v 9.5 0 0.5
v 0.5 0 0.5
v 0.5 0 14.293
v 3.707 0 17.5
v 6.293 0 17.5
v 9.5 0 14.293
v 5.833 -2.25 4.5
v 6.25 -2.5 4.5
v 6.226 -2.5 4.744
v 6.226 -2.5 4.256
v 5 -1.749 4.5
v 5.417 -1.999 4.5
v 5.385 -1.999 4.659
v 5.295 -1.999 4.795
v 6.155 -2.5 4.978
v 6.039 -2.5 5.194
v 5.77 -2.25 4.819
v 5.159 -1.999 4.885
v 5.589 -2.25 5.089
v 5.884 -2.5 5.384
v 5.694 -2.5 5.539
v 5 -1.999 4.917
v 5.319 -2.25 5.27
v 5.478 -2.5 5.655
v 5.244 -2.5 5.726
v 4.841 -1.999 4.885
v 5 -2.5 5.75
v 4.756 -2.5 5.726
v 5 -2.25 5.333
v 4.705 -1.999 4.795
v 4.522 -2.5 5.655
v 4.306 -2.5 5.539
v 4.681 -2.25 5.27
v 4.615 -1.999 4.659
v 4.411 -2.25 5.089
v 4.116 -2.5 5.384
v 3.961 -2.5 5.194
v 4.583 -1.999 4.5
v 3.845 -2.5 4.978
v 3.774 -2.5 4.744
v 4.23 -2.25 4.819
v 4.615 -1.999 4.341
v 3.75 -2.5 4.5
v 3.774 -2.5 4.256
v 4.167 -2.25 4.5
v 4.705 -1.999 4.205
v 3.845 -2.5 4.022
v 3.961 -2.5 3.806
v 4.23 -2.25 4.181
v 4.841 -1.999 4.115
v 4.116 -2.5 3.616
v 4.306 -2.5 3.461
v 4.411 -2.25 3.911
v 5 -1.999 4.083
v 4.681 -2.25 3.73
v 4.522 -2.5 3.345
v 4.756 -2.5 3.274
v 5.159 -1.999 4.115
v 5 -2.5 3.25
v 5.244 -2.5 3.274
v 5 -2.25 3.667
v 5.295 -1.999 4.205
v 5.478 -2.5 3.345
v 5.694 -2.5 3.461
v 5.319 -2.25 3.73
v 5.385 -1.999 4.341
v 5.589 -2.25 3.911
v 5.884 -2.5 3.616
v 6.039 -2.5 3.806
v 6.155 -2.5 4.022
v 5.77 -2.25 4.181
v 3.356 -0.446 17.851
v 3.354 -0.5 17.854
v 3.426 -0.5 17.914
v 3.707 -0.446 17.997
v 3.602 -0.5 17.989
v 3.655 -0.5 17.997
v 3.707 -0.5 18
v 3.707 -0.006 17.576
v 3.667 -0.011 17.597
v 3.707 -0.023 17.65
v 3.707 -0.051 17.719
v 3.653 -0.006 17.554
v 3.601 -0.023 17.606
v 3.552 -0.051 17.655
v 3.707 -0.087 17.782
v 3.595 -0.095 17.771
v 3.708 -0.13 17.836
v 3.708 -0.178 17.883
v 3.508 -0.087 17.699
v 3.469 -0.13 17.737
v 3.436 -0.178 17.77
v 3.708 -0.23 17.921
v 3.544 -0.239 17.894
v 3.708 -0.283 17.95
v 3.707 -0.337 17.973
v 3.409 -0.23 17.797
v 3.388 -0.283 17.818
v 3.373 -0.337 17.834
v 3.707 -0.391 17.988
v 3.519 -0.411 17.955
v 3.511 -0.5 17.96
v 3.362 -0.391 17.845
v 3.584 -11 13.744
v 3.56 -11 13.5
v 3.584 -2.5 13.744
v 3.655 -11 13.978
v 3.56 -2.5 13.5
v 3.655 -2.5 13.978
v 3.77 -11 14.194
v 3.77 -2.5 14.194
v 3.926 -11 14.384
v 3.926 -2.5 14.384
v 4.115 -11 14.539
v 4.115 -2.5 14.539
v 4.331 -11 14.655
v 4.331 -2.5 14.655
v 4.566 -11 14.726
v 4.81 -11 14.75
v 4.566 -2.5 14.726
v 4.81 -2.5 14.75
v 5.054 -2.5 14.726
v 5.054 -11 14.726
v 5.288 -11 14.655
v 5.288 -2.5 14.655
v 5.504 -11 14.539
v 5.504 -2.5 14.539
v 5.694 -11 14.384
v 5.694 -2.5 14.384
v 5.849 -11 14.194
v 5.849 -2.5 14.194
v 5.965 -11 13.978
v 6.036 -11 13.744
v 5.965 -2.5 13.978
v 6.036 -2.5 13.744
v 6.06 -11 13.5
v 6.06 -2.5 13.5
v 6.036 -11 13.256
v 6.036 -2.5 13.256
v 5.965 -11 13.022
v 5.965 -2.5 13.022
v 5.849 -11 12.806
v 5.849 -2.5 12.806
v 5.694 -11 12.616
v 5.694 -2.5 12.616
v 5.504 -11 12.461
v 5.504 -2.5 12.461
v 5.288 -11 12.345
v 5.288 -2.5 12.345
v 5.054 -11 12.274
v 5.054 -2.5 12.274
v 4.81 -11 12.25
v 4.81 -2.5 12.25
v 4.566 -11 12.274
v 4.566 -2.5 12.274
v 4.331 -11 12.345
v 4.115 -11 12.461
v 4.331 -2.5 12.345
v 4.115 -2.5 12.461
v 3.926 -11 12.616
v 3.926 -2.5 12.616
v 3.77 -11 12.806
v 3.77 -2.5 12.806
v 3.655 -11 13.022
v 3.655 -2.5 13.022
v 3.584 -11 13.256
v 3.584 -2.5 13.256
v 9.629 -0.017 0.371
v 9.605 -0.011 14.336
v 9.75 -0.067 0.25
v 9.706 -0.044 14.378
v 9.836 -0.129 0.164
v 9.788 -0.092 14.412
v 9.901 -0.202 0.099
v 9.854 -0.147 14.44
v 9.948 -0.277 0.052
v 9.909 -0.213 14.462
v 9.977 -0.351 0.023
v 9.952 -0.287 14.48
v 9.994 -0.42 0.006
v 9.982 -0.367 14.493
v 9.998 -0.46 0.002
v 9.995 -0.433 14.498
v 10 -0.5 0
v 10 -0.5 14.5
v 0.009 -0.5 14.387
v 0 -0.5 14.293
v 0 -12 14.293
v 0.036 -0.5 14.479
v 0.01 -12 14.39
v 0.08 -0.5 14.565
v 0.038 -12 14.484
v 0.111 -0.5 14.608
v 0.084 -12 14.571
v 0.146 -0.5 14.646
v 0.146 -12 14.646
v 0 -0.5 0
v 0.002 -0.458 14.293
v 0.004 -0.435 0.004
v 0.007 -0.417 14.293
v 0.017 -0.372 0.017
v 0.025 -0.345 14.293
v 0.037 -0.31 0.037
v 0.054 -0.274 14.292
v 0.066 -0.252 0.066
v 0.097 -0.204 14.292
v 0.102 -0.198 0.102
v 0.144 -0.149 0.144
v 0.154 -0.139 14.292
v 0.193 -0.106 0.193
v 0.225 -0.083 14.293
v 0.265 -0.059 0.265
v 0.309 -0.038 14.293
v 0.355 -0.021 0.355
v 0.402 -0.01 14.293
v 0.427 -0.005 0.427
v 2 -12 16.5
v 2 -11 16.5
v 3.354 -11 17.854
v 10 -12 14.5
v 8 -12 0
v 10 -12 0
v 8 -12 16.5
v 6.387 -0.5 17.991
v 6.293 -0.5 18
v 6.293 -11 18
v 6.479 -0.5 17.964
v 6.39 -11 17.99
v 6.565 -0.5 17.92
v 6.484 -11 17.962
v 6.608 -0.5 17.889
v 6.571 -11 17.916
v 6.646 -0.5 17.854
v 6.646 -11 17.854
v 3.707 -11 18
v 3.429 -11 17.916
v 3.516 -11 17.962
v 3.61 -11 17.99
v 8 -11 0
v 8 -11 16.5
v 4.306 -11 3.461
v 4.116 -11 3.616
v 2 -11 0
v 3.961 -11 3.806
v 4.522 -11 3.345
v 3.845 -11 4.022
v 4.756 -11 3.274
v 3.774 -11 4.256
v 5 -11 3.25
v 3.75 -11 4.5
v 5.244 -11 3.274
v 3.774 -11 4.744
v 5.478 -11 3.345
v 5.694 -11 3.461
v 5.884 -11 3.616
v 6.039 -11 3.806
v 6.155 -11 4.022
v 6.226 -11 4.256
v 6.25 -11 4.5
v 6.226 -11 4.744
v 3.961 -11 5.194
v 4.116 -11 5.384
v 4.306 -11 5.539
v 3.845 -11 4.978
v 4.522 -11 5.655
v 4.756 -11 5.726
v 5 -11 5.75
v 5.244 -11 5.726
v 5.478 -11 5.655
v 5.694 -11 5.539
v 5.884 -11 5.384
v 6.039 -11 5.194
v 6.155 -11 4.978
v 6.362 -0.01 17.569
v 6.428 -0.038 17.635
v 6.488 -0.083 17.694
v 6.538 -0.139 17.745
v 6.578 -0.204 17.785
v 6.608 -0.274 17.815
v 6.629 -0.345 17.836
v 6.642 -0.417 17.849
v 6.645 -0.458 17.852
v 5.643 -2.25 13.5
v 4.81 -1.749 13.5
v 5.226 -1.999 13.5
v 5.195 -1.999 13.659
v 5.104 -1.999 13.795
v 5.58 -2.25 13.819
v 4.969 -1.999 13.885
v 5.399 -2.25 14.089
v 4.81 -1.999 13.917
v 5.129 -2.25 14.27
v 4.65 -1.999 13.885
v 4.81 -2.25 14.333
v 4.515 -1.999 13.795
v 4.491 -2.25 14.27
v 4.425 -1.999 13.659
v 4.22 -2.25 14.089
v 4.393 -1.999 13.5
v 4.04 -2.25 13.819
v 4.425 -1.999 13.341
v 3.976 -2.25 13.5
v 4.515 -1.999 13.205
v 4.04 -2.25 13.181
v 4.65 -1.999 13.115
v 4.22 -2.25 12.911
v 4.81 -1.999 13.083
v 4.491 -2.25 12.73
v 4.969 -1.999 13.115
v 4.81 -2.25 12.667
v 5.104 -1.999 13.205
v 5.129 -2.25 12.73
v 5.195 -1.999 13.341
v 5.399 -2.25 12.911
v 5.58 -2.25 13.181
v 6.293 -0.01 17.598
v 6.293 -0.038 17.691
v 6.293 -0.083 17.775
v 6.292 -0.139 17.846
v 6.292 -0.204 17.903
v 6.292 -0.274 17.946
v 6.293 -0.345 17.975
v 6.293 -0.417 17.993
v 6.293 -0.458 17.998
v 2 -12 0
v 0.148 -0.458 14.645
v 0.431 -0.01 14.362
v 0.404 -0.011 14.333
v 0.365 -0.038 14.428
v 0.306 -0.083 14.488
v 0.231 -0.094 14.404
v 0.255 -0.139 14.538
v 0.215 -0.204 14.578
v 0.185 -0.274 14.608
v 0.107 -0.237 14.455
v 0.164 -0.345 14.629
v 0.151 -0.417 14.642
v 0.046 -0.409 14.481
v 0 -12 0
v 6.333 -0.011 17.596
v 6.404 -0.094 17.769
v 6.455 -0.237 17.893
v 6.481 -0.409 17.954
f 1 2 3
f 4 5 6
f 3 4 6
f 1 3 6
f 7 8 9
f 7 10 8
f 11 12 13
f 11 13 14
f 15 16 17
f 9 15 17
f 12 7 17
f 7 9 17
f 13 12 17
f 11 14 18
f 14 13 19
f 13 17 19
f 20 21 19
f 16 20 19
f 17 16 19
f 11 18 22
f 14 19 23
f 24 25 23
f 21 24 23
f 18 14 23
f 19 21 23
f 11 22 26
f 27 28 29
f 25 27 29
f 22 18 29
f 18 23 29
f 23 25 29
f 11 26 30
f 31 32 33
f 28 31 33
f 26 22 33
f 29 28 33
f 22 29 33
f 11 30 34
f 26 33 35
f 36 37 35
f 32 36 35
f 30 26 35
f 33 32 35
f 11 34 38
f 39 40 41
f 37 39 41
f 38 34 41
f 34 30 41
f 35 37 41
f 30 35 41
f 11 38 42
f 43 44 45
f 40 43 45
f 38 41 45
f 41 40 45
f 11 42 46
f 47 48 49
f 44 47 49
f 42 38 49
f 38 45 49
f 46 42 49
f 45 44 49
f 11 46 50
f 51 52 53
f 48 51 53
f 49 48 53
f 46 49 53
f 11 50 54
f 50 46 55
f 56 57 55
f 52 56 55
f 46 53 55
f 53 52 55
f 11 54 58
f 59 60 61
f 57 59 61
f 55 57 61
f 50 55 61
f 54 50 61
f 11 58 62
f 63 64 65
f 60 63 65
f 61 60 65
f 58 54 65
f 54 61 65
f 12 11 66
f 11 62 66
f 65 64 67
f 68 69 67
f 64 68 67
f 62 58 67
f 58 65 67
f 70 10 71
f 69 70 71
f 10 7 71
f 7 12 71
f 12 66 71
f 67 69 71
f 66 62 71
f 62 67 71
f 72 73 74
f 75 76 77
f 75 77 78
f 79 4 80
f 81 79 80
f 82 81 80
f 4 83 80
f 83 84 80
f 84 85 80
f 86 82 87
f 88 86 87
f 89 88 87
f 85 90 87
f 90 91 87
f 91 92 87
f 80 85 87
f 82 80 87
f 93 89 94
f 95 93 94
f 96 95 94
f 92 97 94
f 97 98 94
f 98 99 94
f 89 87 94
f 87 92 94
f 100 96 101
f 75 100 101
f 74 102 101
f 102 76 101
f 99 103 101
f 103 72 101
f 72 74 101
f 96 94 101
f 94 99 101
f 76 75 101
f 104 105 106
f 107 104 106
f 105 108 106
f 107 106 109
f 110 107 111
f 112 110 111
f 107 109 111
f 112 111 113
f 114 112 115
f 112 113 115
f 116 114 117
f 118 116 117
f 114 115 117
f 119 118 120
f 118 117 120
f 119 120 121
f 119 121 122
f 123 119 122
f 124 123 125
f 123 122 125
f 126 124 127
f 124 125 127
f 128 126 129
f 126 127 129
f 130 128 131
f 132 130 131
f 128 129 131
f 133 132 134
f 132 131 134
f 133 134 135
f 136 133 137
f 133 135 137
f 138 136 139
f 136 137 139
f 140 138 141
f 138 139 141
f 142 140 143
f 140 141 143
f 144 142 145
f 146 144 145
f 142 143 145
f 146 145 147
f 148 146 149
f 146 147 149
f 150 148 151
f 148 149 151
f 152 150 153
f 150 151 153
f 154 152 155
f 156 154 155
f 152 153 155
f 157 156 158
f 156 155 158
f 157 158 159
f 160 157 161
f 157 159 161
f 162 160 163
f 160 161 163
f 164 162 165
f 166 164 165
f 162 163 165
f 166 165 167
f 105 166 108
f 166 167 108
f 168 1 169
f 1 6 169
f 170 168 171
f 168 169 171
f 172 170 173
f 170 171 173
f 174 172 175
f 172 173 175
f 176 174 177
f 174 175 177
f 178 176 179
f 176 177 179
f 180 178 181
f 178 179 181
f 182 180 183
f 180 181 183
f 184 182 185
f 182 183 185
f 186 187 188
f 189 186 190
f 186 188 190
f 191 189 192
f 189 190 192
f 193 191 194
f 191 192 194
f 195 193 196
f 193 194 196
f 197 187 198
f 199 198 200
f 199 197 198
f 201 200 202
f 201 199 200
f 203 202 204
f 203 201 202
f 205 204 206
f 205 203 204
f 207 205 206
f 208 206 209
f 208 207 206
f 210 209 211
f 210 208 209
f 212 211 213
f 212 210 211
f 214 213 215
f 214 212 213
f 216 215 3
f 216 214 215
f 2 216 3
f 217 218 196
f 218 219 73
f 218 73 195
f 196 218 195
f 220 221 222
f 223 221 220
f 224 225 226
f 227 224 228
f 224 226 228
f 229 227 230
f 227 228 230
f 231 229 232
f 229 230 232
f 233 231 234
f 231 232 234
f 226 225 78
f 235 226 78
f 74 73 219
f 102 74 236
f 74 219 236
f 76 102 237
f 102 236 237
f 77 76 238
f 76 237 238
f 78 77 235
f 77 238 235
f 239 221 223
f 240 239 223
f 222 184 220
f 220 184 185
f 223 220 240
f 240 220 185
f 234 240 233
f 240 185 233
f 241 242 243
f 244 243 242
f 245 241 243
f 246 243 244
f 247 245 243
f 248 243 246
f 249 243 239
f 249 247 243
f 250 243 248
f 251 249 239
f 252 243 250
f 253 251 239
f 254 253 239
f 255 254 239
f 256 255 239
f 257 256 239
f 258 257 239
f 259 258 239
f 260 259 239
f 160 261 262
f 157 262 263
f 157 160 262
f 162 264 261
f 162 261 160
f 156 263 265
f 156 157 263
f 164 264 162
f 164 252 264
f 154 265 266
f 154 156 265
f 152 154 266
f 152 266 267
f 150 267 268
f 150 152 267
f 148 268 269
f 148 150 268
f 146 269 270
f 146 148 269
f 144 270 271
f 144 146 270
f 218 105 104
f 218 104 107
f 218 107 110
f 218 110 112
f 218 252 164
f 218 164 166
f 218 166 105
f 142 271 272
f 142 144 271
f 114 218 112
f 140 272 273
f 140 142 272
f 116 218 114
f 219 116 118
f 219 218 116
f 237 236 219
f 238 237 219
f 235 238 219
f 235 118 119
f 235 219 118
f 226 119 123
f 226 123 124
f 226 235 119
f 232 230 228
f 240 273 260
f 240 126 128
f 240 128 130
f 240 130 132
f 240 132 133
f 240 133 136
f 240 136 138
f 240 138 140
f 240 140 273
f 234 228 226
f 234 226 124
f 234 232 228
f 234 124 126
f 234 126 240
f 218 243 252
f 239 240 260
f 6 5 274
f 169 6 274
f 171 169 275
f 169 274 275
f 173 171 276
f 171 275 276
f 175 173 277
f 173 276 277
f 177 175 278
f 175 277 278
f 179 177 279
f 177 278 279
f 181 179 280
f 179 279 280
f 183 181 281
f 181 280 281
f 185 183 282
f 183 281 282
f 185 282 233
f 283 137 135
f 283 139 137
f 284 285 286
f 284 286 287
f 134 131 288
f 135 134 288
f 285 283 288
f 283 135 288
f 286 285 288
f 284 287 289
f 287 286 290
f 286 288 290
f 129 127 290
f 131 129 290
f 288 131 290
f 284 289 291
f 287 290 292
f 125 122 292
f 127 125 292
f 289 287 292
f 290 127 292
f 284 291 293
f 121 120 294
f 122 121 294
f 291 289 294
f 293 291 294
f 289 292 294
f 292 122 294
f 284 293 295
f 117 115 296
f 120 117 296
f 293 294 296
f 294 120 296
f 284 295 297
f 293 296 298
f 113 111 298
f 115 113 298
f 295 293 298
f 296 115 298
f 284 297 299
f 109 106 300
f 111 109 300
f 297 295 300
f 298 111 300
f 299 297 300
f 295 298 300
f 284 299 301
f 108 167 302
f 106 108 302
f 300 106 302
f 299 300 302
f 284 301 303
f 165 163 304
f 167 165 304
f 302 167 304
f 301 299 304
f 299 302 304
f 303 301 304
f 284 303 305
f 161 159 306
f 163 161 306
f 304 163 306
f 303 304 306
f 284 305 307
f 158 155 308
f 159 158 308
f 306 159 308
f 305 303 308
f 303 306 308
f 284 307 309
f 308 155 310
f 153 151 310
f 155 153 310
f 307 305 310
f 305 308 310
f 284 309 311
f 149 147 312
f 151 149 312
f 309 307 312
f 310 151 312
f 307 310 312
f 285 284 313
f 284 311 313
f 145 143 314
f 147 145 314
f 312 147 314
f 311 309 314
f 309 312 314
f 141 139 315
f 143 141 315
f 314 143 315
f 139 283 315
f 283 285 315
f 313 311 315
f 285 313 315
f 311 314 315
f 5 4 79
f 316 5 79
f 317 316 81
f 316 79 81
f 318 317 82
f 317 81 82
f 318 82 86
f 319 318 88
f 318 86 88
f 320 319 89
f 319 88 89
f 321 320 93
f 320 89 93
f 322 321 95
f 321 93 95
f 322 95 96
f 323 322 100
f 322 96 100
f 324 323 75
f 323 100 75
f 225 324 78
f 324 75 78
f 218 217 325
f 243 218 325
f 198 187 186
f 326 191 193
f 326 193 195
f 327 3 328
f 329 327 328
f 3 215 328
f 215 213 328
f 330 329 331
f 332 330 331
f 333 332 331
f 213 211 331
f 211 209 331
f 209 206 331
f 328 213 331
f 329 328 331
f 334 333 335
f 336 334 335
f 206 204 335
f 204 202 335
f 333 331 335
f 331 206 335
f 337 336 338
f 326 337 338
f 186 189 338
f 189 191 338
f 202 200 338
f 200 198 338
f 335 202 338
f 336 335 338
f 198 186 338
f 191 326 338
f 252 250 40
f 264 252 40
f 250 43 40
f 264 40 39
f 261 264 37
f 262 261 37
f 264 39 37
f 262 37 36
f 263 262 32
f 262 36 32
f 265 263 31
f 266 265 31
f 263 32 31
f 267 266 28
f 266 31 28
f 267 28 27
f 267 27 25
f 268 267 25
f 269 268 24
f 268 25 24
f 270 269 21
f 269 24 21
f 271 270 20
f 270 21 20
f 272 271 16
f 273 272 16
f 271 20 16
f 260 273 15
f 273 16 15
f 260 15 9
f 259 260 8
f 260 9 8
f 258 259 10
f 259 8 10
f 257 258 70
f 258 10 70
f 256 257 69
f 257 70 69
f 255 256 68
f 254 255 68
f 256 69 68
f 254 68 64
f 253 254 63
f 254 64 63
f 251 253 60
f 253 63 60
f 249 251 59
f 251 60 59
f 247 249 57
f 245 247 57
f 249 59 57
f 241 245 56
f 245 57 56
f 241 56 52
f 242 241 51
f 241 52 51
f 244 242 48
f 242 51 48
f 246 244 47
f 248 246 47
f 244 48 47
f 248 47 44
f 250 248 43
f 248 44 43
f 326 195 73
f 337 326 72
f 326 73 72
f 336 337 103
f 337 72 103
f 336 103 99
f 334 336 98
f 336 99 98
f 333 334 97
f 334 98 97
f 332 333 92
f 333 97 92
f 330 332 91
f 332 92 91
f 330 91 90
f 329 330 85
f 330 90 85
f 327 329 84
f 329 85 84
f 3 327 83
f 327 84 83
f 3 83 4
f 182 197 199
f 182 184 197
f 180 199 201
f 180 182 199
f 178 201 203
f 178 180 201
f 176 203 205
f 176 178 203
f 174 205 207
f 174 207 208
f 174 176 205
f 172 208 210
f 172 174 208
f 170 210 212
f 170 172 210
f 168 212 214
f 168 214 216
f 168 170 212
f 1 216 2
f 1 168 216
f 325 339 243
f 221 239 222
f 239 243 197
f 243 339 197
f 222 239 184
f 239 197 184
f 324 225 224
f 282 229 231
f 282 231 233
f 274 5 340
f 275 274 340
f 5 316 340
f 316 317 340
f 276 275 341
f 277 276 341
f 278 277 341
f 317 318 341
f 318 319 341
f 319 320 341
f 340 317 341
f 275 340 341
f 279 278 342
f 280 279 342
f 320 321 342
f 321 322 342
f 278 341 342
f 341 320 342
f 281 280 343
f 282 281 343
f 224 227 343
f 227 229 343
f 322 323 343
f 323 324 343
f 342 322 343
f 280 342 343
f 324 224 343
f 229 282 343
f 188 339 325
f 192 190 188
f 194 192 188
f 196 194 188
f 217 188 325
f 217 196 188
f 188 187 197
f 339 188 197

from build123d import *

# Parameters (mm, degrees)
F1_DEPTH    = 12
F2_W        = 6
F2_H        = 22.400515154
F4_DEPTH    = 1
F6_D        = 2.5
F6_DEPTH    = 9.5
F6_TIP      = 0.7510757738
F7_R        = 0.5
F8_T1_DEPTH = 4.7928932188
F8_T3_DEPTH = 6.7426406871
F9_R        = 0.5


# Not quite as in the source:
# - a fillet or chamfer that OpenCascade refuses, or shapes differently, is made with other operations: its cross-section is extruded or revolved along the edge and cut away or added


with BuildPart() as f1:
    # F0 (on Front) → F1 (new body)
    with BuildSketch(Plane.XZ):
        Polygon((0, 14.5), (0, 0), (10, 0), (10, 14.5), (6.5, 18), (3.5, 18), align=None)
    extrude(amount=F1_DEPTH)

    # F2 (on face) → F4 (cut)
    with BuildSketch(Plane.XZ.offset(12)):
        with Locations((5, 11.200257577)):
            Rectangle(F2_W, F2_H)
        Polygon((2, 16.5), (2, 0), (8, 0), (8, 16.5), (6.5, 18), (3.5, 18), align=None)
    extrude(amount=-F4_DEPTH, mode=Mode.SUBTRACT)

    # F6
    with Locations(Plane.XZ.offset(12)):
        with Locations((4.8096684931, 13.5), (5, 4.5)):
            Hole(F6_D / 2, depth=F6_DEPTH)
            with Locations((0, 0, -(F6_DEPTH + F6_TIP / 2))):  # 118° drill point
                Cone(0, F6_D / 2, F6_TIP, mode=Mode.SUBTRACT)

    # F7
    f7_edges = [f1.edges().sort_by_distance(p)[0] for p in [
        (10, 0, 7.25),
        (8.25, 0, 16.25),
        (0, 0, 7.25),
        (5, 0, 0),
    ]]
    fillet(f7_edges, radius=F7_R)

    # F8: fillet of radius 0.5 on 2 edges, made by hand

    # F8_s2 → F8_t1 (cut)
    with BuildSketch(Plane.YZ.offset(2.25)):
        with BuildLine():
            ThreePointArc((0, 17.5), (-0.1464466094, 17.8535533906), (-0.5, 18))
            Line((-0.5, 18), (0, 18))
            Line((0, 18), (0, 17.5))
        make_face()
    extrude(amount=F8_T1_DEPTH, mode=Mode.SUBTRACT)

    # F8_s4 → F8_t3 (cut)
    with BuildSketch(Plane(origin=(11.6338834765, 0, 11.6338834765), x_dir=(0, 1, 0), z_dir=(-0.7071067812, 0, -0.7071067812))):
        with BuildLine():
            ThreePointArc((-0.5, -10.2530483272), (-0.1464466094, -10.1066017178), (0, -9.7530483272))
            Line((0, -9.7530483272), (0, -10.2530483272))
            Line((0, -10.2530483272), (-0.5, -10.2530483272))
        make_face()
    extrude(amount=F8_T3_DEPTH, mode=Mode.SUBTRACT)

    # F9
    f9_edges = [f1.edges().sort_by_distance(p)[0] for p in [
        (3.5, -5.75, 18),
        (0, -6.25, 14.5),
        (6.5, -5.75, 18),
    ]]
    fillet(f9_edges, radius=F9_R)


solid = f1.part
